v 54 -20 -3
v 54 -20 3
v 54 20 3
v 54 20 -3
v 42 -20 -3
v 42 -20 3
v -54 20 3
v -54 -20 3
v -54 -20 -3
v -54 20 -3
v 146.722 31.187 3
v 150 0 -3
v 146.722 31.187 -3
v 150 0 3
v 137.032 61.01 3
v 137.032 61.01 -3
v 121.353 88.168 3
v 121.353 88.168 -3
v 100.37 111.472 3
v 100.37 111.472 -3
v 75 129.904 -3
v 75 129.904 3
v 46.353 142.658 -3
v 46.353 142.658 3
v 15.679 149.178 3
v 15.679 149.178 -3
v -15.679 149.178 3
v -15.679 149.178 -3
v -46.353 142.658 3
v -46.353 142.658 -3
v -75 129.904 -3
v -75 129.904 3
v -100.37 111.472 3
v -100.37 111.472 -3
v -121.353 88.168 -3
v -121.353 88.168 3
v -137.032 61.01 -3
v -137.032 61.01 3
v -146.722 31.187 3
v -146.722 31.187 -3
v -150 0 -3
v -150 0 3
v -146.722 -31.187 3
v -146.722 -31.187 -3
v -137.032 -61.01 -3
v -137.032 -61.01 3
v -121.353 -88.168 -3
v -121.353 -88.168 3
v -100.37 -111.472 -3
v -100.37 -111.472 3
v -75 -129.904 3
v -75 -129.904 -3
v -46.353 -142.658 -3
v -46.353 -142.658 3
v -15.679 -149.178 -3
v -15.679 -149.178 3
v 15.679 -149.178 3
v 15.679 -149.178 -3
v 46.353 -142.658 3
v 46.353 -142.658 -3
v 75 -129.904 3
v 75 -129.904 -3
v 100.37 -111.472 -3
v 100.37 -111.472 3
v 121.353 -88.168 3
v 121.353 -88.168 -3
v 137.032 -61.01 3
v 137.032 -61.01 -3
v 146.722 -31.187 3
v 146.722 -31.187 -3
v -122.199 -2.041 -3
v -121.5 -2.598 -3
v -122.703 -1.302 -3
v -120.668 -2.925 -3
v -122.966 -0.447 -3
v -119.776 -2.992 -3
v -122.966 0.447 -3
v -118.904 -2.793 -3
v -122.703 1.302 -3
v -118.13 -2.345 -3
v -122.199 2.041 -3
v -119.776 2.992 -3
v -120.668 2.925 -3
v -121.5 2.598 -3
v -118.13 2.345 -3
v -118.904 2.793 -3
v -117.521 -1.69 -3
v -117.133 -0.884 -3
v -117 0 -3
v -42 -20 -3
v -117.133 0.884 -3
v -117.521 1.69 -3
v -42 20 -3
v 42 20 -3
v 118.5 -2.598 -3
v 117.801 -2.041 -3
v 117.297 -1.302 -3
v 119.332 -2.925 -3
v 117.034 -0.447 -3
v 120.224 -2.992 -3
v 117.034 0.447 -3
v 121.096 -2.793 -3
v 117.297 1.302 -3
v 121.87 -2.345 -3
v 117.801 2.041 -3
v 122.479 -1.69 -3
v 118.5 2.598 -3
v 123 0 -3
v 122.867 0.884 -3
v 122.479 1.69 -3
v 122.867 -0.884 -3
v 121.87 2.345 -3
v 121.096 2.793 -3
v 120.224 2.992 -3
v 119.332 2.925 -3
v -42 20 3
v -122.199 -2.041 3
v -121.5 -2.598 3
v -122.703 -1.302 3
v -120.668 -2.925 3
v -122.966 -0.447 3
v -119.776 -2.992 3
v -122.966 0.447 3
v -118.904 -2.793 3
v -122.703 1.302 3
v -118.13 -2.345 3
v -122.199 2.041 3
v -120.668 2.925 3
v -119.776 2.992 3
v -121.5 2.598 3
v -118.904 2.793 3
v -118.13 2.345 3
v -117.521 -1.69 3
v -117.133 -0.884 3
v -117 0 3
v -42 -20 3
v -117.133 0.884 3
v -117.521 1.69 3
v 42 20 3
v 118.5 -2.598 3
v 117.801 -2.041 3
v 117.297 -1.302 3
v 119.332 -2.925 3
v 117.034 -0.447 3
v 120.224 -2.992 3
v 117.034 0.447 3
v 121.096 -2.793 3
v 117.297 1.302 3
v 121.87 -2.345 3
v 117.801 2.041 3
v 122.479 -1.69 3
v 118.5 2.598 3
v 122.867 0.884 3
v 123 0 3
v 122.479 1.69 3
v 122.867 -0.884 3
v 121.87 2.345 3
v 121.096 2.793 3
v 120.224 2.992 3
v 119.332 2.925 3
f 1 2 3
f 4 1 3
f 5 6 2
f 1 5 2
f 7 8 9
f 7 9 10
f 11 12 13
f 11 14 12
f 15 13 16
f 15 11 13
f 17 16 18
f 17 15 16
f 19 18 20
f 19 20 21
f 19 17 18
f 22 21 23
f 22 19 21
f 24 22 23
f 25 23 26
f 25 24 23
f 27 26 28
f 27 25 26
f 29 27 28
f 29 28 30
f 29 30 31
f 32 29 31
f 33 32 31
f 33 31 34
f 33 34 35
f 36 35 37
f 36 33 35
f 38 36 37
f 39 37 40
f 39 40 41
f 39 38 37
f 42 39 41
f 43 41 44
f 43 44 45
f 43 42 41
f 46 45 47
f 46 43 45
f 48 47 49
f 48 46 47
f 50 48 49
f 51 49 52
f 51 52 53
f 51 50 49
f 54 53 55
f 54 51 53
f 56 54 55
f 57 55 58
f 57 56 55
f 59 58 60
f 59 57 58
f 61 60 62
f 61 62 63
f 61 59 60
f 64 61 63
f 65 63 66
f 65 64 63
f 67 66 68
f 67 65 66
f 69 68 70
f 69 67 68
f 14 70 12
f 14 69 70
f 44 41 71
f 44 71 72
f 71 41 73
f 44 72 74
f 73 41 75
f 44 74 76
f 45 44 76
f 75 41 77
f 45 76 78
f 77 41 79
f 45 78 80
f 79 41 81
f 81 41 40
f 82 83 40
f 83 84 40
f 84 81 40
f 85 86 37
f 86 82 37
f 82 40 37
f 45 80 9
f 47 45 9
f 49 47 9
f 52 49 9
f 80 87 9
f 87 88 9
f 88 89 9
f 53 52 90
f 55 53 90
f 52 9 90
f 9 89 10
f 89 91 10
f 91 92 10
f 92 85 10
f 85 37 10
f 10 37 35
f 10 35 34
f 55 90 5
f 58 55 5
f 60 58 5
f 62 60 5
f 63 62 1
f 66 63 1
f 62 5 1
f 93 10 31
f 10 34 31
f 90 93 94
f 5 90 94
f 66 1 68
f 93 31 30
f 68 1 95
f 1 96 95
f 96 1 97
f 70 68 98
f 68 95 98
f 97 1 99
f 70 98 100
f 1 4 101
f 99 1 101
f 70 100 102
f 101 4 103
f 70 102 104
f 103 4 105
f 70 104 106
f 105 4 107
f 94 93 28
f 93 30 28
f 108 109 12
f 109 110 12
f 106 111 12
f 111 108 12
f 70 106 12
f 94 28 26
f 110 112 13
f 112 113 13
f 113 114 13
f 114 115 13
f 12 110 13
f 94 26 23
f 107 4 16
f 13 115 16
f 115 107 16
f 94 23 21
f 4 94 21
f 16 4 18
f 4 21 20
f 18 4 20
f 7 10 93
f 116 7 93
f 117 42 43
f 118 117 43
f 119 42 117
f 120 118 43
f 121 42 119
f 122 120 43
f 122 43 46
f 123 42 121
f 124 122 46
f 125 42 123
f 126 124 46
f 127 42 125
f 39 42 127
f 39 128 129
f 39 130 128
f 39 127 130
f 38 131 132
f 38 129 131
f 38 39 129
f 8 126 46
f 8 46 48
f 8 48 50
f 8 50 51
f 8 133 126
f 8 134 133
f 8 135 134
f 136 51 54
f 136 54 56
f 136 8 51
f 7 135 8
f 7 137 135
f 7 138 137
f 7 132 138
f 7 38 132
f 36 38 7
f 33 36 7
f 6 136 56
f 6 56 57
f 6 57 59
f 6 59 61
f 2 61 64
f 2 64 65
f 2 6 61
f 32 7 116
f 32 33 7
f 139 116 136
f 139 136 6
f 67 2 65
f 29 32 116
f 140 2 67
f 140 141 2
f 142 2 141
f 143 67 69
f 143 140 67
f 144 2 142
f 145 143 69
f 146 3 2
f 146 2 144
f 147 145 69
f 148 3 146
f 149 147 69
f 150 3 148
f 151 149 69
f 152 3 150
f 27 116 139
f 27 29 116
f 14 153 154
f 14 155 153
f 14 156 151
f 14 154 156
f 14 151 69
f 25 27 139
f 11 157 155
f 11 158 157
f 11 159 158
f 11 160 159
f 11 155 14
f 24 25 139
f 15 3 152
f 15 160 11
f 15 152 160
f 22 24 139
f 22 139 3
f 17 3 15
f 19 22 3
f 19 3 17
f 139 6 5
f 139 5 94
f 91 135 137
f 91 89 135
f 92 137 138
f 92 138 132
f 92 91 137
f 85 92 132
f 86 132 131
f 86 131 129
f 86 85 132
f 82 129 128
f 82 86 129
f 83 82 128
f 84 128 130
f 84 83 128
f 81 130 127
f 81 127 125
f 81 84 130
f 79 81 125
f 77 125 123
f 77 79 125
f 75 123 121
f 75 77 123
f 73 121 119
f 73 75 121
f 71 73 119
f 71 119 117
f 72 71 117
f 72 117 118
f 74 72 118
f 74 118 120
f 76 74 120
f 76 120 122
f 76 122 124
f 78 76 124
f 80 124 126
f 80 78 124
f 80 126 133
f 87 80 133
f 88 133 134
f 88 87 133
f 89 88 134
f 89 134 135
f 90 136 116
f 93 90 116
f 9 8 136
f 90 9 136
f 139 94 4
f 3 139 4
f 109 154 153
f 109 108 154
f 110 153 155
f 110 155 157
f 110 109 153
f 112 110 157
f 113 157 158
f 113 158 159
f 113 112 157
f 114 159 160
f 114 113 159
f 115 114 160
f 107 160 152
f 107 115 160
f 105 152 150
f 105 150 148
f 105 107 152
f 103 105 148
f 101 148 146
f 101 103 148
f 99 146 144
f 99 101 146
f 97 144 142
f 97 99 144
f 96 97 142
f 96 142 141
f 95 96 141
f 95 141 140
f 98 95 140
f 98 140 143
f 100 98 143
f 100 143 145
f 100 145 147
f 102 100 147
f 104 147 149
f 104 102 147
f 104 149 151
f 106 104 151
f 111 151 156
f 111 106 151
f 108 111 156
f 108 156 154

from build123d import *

# Parameters (mm, degrees)
F0_R     = 150
F0_R_2   = 3
F0_W     = 12
F0_H     = 40
F1_DEPTH = 3


with BuildPart() as f1:
    # F0 (on Top) → F1 (new body, symmetric)
    with BuildSketch(Plane.XY):
        Circle(F0_R)
        with Locations((-120, 0)):
            Circle(F0_R_2, mode=Mode.SUBTRACT)
        with Locations((-48, 0)):
            Rectangle(F0_W, F0_H, mode=Mode.SUBTRACT)
        with Locations((48, 0)):
            Rectangle(F0_W, F0_H, mode=Mode.SUBTRACT)
        with Locations((120, 0)):
            Circle(F0_R_2, mode=Mode.SUBTRACT)
    extrude(amount=F1_DEPTH, both=True)


solid = f1.part
